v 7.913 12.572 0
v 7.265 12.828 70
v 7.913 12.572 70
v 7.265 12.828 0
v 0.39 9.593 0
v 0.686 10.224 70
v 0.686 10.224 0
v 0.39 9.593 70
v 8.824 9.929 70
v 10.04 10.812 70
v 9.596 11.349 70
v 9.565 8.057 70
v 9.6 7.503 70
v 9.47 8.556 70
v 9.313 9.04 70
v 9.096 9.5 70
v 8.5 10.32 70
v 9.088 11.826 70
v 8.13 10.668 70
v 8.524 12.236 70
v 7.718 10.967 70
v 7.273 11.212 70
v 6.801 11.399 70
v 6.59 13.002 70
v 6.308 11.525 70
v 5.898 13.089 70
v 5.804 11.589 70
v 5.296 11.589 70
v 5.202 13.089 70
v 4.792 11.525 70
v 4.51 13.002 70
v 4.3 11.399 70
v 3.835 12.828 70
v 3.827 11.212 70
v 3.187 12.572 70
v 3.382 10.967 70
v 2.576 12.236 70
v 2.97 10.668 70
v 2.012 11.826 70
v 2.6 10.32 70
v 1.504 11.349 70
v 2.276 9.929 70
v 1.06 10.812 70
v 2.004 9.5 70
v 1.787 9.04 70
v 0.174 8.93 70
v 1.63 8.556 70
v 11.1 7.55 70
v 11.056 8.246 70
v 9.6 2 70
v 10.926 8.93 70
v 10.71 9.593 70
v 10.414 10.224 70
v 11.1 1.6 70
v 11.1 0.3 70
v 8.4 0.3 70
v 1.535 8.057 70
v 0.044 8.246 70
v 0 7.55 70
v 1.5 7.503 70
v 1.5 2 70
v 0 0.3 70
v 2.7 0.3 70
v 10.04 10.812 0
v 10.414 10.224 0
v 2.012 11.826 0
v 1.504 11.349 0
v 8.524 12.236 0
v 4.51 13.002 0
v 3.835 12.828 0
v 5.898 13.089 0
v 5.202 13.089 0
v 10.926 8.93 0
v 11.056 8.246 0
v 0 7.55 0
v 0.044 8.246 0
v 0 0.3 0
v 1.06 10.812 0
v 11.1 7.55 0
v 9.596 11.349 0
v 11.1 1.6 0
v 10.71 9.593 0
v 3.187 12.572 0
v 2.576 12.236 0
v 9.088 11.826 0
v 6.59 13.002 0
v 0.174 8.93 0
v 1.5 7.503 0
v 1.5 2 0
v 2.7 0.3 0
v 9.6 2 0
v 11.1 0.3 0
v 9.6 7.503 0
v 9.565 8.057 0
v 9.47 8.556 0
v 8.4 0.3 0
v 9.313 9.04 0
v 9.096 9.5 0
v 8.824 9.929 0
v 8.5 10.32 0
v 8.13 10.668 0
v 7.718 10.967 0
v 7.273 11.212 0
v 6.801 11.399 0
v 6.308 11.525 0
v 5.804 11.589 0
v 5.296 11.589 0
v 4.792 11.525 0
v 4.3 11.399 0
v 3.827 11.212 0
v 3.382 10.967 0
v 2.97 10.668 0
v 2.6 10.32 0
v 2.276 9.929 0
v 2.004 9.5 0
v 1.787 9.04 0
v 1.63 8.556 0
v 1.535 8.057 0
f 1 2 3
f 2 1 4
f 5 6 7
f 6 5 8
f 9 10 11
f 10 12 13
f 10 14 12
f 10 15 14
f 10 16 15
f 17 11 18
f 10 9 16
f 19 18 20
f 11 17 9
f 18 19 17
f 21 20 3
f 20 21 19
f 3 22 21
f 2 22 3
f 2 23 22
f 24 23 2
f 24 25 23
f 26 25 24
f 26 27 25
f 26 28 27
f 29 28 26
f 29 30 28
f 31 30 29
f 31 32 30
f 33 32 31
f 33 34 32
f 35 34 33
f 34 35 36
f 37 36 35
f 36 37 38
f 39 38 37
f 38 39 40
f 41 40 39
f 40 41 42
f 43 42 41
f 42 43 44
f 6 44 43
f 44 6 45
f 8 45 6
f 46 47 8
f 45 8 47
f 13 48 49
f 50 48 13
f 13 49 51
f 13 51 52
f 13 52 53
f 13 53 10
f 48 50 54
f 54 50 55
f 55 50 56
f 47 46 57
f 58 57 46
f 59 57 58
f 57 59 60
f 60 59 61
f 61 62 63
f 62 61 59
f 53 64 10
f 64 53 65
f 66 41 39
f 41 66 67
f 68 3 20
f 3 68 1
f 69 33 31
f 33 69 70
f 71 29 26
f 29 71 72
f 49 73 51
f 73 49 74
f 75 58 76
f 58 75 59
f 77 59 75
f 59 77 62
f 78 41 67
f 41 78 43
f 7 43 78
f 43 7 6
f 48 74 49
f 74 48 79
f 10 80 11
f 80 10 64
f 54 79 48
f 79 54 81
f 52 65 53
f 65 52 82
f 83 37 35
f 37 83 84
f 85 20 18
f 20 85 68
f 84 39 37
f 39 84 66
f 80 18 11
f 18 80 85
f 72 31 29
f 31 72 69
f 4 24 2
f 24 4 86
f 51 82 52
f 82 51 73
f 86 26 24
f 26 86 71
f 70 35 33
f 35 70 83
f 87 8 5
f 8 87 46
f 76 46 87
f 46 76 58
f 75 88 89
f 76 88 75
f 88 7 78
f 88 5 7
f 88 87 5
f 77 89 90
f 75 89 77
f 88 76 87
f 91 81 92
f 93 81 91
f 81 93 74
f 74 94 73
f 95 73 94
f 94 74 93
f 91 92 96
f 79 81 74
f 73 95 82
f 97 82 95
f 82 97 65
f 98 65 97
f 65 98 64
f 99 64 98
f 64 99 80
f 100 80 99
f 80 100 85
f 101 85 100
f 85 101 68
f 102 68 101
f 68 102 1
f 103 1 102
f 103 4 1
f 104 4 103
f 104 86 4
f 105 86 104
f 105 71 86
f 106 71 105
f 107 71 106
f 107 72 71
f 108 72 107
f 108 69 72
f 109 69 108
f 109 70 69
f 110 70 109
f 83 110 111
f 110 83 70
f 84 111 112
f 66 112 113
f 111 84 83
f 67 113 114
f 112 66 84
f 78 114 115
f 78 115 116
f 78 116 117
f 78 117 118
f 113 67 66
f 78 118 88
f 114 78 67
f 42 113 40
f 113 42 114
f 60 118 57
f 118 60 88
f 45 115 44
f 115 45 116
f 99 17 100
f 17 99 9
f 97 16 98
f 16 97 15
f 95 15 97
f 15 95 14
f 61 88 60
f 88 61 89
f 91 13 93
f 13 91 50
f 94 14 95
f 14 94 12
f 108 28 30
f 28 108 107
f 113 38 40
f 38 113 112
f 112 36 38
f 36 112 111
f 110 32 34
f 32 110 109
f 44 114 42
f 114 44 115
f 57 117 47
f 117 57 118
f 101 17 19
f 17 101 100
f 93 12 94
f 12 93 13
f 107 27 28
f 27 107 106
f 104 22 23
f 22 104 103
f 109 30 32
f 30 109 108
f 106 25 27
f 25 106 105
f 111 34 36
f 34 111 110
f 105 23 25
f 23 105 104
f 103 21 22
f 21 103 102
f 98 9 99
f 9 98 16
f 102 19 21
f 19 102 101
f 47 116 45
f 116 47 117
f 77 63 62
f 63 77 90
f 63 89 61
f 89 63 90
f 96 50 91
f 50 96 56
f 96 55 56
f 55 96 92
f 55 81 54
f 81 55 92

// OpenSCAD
//// Motor Wire Shield - square tube

$fn = 50;

// Inner dimensions
inner = 8.1;
// Wall thickness
wall = 1.5;

// Length
length = 70;

// Extra depth on the clip legs (beyond square) for better grip
clip_extra = 2;

// Retention lip — inward triangle at each leg tip to hold cables
lip = 1.2;

outer   = inner + 2 * wall;        // 11.2 — width
outer_h = outer + clip_extra;      // 14.2 — leg depth (taller than wide)
corner_r = 1.5;

difference() {
    // Outer — rectangular body with semicircular rounded top
    linear_extrude(length)
        hull() {
            offset(r=corner_r) offset(delta=-corner_r)
                square([outer, outer_h - outer/2]);
            translate([outer/2, outer_h - outer/2])
                circle(r = outer/2);
        };

    // Inner cutout — uniform wall thickness, mirrors outer curve
    translate([0, 0, -0.1])
        linear_extrude(length + 0.2)
            offset(delta = -wall)
                hull() {
                    offset(r=corner_r) offset(delta=-corner_r)
                        square([outer, outer_h - outer/2]);
                    translate([outer/2, outer_h - outer/2])
                        circle(r = outer/2);
                };

    // Open one long side (remove a wall)
    translate([-0.1, -0.1, -0.1])
        cube([outer + 0.2, wall + 0.2, length + 0.2]);
}

// Retention lips — trapezoids anchored in leg body, nub extends inward below opening
linear_extrude(length)
    union() {
        // Left leg: overlaps 0.5mm into leg body so it attaches
        translate([0, wall])
            polygon([[0, 0.5], [wall, 0.5], [wall+lip, -lip], [0, -lip]]);
        // Right leg: mirror
        translate([outer-wall, wall])
            polygon([[0, 0.5], [wall, 0.5], [wall, -lip], [-lip, -lip]]);
    }
